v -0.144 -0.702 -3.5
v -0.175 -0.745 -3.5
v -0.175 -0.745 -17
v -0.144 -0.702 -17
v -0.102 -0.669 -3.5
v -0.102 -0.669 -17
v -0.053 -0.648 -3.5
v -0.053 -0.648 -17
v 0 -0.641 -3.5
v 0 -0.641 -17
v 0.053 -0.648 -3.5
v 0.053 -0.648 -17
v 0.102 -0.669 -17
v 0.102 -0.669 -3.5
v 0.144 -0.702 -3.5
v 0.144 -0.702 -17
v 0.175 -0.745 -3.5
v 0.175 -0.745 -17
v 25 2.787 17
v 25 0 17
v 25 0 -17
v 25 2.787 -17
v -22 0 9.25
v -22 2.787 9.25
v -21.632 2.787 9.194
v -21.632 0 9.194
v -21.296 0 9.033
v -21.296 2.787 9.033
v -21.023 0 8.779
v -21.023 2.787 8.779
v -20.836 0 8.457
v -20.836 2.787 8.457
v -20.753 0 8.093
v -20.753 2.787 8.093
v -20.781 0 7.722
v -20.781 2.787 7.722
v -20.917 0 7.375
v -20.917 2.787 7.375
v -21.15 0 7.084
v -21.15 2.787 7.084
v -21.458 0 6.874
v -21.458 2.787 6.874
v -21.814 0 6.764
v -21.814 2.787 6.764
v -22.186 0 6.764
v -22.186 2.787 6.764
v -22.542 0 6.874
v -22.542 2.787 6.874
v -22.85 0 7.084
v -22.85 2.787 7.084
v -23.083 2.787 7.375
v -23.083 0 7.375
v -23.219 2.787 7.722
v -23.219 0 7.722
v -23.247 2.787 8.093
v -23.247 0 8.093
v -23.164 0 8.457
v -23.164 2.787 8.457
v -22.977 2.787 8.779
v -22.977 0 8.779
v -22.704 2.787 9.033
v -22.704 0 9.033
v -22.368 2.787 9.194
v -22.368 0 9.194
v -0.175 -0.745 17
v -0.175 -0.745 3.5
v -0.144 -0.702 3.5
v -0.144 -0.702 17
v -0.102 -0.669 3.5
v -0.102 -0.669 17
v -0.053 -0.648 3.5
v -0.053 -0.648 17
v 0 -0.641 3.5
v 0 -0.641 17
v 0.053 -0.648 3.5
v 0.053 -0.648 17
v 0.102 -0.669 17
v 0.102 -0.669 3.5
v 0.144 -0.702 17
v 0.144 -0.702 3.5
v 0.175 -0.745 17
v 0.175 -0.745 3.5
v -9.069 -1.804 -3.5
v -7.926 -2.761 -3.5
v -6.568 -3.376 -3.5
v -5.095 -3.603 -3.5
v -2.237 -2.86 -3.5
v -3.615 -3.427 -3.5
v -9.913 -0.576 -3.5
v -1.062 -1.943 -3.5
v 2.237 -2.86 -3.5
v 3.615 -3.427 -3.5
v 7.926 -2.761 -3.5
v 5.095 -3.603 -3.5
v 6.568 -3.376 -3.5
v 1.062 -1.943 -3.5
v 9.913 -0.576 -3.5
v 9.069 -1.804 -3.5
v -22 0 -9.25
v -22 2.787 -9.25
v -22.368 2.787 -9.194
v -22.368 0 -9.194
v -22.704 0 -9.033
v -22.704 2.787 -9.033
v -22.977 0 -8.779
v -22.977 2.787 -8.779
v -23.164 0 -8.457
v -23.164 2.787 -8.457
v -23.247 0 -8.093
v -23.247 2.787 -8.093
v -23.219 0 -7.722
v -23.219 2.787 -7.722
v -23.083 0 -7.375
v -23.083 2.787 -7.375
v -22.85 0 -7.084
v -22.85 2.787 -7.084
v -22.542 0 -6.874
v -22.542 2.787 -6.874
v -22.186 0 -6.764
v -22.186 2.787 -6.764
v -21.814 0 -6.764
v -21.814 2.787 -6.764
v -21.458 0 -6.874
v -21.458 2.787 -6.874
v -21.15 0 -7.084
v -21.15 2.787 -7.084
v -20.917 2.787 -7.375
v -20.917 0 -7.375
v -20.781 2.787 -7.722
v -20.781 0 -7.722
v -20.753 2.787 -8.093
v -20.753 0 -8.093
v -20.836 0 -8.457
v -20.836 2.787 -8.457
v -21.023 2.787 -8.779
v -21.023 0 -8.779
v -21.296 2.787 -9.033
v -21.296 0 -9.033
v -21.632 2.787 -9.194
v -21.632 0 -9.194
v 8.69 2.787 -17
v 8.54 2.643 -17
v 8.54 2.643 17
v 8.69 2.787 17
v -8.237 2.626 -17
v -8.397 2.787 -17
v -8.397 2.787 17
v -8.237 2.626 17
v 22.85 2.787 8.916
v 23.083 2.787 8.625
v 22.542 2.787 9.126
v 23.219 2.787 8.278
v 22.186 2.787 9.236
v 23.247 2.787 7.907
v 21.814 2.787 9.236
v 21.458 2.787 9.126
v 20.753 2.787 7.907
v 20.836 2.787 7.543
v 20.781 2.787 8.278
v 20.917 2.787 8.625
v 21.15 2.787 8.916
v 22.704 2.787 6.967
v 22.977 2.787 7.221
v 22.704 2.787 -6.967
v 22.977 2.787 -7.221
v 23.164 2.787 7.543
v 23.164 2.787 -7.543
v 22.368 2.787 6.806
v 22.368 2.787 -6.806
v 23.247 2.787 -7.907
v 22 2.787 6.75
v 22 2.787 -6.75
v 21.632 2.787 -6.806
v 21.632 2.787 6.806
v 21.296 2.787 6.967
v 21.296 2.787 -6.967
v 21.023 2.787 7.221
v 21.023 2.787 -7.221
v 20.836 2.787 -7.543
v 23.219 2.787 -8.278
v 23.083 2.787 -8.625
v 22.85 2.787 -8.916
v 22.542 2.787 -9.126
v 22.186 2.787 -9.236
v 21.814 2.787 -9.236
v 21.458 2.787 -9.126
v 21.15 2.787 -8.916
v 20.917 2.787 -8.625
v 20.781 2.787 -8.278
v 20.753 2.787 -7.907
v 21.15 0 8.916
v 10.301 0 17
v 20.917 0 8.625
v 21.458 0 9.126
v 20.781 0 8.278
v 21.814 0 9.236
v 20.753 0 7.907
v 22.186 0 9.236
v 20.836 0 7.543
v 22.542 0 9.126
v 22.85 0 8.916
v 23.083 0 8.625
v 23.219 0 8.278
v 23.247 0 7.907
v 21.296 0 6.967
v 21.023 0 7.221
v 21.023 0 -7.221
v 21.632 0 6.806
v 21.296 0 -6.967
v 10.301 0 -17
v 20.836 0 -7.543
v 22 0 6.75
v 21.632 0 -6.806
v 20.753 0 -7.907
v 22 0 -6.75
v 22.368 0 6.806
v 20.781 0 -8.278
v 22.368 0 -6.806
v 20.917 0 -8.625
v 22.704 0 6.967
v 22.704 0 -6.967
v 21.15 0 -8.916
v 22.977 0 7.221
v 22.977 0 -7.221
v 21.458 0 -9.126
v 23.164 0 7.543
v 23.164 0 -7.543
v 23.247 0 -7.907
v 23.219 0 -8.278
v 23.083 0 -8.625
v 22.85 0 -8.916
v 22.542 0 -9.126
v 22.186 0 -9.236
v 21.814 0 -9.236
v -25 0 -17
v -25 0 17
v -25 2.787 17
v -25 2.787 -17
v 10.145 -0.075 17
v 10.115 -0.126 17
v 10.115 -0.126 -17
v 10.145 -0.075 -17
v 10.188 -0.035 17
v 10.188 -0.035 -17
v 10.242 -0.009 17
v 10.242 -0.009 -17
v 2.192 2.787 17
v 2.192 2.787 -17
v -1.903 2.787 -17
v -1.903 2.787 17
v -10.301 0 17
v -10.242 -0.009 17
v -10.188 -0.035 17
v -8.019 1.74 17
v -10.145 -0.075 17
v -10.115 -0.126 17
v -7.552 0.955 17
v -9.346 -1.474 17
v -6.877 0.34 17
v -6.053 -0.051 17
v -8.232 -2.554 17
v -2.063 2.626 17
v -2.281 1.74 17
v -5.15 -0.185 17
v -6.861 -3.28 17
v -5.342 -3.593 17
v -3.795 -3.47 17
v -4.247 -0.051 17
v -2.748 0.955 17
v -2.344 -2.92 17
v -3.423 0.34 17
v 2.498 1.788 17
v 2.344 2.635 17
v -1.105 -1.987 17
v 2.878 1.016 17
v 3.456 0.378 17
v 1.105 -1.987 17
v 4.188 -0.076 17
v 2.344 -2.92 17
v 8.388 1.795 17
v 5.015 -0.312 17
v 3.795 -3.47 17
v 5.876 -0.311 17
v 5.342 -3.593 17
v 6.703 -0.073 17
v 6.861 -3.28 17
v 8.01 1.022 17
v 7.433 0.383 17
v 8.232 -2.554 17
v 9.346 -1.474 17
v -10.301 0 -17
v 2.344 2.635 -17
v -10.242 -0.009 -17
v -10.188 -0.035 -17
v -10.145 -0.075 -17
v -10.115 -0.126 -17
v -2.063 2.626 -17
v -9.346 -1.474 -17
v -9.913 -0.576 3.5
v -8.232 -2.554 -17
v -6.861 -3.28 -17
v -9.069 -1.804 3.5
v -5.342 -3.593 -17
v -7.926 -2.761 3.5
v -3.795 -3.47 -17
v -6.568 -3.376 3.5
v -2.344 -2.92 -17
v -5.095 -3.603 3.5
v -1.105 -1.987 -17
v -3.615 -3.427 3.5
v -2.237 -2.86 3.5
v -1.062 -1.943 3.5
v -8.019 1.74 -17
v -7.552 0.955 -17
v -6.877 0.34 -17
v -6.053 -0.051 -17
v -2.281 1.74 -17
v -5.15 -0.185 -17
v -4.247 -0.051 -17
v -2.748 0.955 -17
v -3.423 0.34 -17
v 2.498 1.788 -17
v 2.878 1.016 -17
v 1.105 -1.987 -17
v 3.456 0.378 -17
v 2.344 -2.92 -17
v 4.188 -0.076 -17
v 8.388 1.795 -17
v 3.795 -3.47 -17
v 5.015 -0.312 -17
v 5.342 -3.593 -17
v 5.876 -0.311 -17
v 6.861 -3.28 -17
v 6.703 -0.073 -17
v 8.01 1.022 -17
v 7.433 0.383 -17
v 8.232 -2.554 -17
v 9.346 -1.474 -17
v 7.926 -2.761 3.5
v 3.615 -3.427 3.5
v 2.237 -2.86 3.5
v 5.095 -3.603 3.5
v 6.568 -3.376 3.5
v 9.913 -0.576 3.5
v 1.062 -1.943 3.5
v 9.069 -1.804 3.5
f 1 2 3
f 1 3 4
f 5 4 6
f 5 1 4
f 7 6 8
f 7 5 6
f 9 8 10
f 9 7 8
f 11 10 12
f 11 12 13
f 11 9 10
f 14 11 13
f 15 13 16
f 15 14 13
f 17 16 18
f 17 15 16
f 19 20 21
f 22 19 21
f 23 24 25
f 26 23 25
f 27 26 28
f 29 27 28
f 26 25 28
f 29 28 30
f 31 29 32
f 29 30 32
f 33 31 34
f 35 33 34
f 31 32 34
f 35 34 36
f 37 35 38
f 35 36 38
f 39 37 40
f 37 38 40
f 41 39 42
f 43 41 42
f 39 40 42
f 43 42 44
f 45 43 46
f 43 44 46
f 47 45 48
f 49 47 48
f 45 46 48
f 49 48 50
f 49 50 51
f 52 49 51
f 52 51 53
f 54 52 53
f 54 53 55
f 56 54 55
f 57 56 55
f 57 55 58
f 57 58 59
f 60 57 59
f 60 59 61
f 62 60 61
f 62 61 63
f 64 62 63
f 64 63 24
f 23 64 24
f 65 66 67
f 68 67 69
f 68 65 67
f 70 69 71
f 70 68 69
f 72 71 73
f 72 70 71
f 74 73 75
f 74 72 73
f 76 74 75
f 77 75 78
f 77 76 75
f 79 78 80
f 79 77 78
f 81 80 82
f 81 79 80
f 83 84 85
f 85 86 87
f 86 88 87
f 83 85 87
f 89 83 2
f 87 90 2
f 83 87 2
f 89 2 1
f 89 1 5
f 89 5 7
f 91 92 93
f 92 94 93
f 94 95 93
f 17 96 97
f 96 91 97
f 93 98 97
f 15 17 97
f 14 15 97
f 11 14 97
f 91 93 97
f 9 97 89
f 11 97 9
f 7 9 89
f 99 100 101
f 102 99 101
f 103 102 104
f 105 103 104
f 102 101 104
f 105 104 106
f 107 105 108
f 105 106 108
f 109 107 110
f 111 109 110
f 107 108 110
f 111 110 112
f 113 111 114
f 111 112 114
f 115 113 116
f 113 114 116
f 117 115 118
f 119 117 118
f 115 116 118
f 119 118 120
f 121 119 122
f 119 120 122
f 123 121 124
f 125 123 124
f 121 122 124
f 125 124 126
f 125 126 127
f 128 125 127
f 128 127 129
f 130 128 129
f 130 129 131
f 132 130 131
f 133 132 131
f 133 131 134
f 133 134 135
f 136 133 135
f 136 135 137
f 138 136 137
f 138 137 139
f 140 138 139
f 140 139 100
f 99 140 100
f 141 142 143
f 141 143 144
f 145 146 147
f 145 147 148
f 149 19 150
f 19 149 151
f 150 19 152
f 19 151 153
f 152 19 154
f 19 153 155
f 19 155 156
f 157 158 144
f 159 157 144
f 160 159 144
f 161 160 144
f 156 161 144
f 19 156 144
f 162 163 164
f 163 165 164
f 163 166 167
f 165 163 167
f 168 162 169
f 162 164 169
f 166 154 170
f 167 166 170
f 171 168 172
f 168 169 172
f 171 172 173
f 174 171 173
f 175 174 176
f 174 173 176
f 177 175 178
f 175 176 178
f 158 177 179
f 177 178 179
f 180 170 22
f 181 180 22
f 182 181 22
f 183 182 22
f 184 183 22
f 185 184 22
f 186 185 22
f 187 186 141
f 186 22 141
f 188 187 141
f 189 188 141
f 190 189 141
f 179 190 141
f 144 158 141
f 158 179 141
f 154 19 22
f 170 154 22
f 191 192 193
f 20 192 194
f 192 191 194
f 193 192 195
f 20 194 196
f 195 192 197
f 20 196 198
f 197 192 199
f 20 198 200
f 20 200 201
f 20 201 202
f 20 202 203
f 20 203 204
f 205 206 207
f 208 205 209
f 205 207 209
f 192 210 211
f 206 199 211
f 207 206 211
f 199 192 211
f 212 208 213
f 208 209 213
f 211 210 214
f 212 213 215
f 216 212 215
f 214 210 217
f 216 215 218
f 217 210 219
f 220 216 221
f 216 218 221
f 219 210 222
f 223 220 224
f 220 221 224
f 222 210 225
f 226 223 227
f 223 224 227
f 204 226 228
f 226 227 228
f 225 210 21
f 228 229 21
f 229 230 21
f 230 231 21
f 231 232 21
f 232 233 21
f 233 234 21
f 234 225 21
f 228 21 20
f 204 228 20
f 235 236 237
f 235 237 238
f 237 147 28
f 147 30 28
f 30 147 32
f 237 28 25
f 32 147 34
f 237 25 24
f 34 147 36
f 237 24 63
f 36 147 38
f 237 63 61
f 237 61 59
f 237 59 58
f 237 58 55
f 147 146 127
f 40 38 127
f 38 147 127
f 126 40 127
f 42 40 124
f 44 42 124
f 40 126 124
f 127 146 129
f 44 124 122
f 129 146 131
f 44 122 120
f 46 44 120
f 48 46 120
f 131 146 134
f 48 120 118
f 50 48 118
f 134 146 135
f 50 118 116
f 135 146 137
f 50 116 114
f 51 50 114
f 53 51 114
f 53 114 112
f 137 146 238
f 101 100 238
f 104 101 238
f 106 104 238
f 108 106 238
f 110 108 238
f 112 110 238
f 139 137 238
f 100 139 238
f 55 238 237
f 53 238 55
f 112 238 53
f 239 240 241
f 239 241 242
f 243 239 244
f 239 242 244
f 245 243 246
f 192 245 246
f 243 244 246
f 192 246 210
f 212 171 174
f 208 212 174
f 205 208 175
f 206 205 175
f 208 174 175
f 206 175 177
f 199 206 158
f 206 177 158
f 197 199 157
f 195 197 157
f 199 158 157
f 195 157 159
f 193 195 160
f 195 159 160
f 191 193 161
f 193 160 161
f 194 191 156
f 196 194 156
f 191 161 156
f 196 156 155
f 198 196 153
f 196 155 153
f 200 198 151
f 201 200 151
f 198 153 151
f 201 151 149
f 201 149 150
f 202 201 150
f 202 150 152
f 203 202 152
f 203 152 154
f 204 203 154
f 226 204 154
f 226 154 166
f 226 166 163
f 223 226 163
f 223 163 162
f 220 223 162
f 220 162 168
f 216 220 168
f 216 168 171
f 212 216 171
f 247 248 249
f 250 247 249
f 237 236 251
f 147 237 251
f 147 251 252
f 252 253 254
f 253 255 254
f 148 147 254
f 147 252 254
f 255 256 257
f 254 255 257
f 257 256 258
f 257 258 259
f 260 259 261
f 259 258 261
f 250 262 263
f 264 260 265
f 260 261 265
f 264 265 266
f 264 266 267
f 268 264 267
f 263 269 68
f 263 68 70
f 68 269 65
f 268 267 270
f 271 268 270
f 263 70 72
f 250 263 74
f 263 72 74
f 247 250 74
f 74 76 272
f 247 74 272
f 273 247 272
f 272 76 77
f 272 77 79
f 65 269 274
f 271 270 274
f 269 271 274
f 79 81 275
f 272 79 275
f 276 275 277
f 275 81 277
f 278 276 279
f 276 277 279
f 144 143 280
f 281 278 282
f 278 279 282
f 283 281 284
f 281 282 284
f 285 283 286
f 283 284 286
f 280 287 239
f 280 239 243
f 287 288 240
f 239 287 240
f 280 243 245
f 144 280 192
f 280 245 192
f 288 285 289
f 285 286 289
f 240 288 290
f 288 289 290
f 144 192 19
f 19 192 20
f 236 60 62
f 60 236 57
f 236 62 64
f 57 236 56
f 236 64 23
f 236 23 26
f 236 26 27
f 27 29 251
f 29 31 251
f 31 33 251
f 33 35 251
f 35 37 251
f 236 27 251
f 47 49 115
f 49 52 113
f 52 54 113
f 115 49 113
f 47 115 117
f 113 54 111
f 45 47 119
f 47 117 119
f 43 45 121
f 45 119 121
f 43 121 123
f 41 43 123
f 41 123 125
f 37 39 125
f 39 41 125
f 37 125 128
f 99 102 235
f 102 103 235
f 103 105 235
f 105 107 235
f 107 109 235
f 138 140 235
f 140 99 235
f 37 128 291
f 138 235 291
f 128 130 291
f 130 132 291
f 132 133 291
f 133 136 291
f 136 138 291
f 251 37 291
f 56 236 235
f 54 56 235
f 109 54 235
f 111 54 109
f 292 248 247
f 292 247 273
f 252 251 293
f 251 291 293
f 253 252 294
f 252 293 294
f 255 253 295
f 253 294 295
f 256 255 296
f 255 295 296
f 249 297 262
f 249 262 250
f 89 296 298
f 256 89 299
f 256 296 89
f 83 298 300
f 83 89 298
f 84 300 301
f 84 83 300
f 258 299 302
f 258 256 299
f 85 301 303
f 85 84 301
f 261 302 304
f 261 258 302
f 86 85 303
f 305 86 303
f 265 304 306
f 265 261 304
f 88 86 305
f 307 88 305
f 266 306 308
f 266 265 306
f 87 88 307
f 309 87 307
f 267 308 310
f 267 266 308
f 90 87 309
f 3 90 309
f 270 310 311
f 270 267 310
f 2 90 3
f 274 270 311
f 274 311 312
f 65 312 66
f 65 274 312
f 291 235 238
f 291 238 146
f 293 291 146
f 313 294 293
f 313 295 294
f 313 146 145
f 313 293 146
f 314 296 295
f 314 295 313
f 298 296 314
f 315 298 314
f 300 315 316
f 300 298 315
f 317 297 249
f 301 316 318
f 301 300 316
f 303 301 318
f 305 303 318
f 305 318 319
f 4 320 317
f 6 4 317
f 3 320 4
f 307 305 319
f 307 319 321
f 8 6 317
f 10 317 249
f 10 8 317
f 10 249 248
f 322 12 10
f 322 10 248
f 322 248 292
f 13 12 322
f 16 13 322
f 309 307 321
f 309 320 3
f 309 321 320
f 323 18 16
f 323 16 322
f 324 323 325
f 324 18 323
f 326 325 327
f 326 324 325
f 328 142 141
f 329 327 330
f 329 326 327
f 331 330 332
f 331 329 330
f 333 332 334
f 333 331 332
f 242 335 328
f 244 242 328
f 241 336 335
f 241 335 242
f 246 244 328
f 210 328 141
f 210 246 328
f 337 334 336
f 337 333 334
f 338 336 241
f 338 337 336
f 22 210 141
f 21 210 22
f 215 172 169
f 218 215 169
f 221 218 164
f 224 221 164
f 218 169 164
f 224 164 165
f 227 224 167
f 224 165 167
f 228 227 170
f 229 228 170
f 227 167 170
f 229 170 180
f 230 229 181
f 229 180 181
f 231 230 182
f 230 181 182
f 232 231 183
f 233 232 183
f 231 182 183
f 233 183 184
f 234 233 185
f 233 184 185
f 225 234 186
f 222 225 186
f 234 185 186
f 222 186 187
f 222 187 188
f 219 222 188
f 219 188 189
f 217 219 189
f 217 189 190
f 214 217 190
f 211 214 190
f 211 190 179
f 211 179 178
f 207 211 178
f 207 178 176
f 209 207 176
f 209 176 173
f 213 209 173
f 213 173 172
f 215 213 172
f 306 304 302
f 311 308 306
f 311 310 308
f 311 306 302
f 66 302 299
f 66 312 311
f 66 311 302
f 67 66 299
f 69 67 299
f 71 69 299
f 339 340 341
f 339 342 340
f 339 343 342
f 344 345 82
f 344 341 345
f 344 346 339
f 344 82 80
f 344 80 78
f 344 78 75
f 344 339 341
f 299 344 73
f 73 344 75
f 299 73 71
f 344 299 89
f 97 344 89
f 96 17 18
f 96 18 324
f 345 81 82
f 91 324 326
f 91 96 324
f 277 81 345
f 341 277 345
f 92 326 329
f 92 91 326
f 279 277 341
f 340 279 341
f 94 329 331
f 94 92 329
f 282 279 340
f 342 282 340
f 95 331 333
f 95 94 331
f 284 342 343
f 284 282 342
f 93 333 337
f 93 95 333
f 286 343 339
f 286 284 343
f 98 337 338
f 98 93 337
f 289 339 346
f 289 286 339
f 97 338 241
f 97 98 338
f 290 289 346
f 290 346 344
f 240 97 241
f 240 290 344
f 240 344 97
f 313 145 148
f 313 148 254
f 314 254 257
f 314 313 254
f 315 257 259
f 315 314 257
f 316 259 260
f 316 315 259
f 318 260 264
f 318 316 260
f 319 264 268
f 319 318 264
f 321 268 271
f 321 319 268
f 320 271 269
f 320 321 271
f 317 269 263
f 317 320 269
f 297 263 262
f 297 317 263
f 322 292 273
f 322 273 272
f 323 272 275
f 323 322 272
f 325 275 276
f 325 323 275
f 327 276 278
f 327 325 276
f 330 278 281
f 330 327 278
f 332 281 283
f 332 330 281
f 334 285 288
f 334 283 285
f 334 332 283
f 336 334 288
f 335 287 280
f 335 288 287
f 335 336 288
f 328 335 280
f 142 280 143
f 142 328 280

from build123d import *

# Parameters (mm, degrees)
SKETCH1_W           = 50
SKETCH1_H           = 34
BOSS_EXTRUDE1_DEPTH = 3
SKETCH2_W           = 38
SKETCH2_H           = 34
BOSS_EXTRUDE2_DEPTH = 3
SKETCH3_R           = 1.25
CUT_EXTRUDE1_DEPTH  = 3
BOSS_EXTRUDE3_DEPTH = 34
CUT_EXTRUDE4_DEPTH  = 43.626282972
SKETCH6_W           = 7
SKETCH6_H           = 4.004114793
CUT_EXTRUDE3_DEPTH  = 54.150729064
FILLET1_R           = 0.2
SKETCH8_W           = 4.910344877
SKETCH8_H           = 2.364797993
CUT_EXTRUDE5_DEPTH  = 43.626282972
FILLET2_R           = 0.5
SKETCH9_W           = 50
SKETCH9_H           = 6.499651724
CUT_EXTRUDE6_DEPTH  = 43.626282972
CHAMFER1_START      = -18
CHAMFER1_DEPTH      = 36


with BuildPart() as part:
    # Sketch1 → Boss-Extrude1 (new body)
    with BuildSketch(Plane(origin=(0, 0, 0), x_dir=(1, 0, 0), z_dir=(0, 1, 0))):
        Rectangle(SKETCH1_W, SKETCH1_H)
    extrude(amount=BOSS_EXTRUDE1_DEPTH)

    # Sketch2 → Boss-Extrude2 (add)
    with BuildSketch(Plane(origin=(0, 3, 0), x_dir=(1, 0, 0), z_dir=(0, 1, 0))):
        Rectangle(SKETCH2_W, SKETCH2_H)
    extrude(amount=BOSS_EXTRUDE2_DEPTH)

    # Sketch3 → Cut-Extrude1 (cut)
    with BuildSketch(Plane(origin=(0, 3, 0), x_dir=(1, 0, 0), z_dir=(0, 1, 0))):
        with Locations(Location((22, 8, 0), (0, 0, 270))):
            Circle(SKETCH3_R)
        with Locations(Location((22, -8, 0), (0, 0, 90))):
            Circle(SKETCH3_R)
        with Locations(Location((-22, -8, 0), (0, 0, 270))):
            Circle(SKETCH3_R)
        with Locations(Location((-22, 8, 0), (0, 0, 90))):
            Circle(SKETCH3_R)
    extrude(amount=-CUT_EXTRUDE1_DEPTH, mode=Mode.SUBTRACT)

    # Sketch5 → Boss-Extrude3 (add)
    with BuildSketch(Plane.XY.offset(17)):
        with BuildLine():
            Line((10.162882175, 0), (-10.162882175, 0))
            ThreePointArc((-10.162882175, 0), (-5.40902103, -3.588814383), (-0.175438596, -0.74480324))
            ThreePointArc((-0.175438596, -0.74480324), (0, -0.640830834), (0.175438596, -0.74480324))
            ThreePointArc((0.175438596, -0.74480324), (5.40902103, -3.588814383), (10.162882175, 0))
        make_face()
    extrude(amount=-BOSS_EXTRUDE3_DEPTH)

    # Sketch7 → Cut-Extrude4 (cut, through all)
    with BuildSketch(Plane(origin=(0, 0, -17), x_dir=(-1, 0, 0), z_dir=(0, 0, -1))):
        with BuildLine():
            Line((-8.541784002, 2.785692228), (-8.541784002, 8.770064047))
            Line((-8.541784002, 8.770064047), (8.249387021, 8.770064047))
            Line((8.249387021, 8.770064047), (8.249387021, 2.975059658))
            ThreePointArc((8.249387021, 2.975059658), (5.18491916, -0.185254174), (2.049991811, 2.905179016))
            Line((2.049991811, 2.905179016), (2.049991811, 5.195476311))
            Line((2.049991811, 5.195476311), (-2.343419325, 5.195476311))
            Line((-2.343419325, 5.195476311), (-2.343419325, 2.855696601))
            ThreePointArc((-2.343419325, 2.855696601), (-5.40689232, -0.341101373), (-8.541784002, 2.785692228))
        make_face()
    extrude(amount=-CUT_EXTRUDE4_DEPTH, mode=Mode.SUBTRACT)

    # Sketch6 → Cut-Extrude3 (cut, through all)
    with BuildSketch(Plane(origin=(25, 0, 0), x_dir=(0, 0, -1), z_dir=(1, 0, 0))):
        with Locations((0, -2.578040121)):
            Rectangle(SKETCH6_W, SKETCH6_H)
    extrude(amount=-CUT_EXTRUDE3_DEPTH, mode=Mode.SUBTRACT)

    # Fillet1
    fillet1_edges = [part.edges().sort_by_distance(p)[0] for p in [
        (10.162882175, 0, 0),
        (-10.162882175, 0, 0),
    ]]
    fillet(fillet1_edges, radius=FILLET1_R)

    # Sketch8 → Cut-Extrude5 (cut, through all)
    with BuildSketch(Plane(origin=(0, 0, -17), x_dir=(-1, 0, 0), z_dir=(0, 0, -1))):
        with Locations((-0.118869912, 4.00385134)):
            Rectangle(SKETCH8_W, SKETCH8_H)
    extrude(amount=-CUT_EXTRUDE5_DEPTH, mode=Mode.SUBTRACT)


with BuildPart() as cut_extrude5_kept_piece:
    # of the separate pieces the step leaves, the one the design keeps (cut_extrude5_pieces_kept)
    add(part.part.solids().sort_by_distance((-10.300657517, 0, -17))[0])

    # Fillet2
    fillet2_edges = [cut_extrude5_kept_piece.edges().sort_by_distance(p)[0] for p in [
        (8.541784002, 6, 0),
        (-8.249387021, 6, 0),
    ]]
    fillet(fillet2_edges, radius=FILLET2_R)

    # Sketch9 → Cut-Extrude6 (cut, through all)
    with BuildSketch(Plane(origin=(0, 0, -17), x_dir=(-1, 0, 0), z_dir=(0, 0, -1))):
        with Locations((0, 6.036788854)):
            Rectangle(SKETCH9_W, SKETCH9_H)
    extrude(amount=-CUT_EXTRUDE6_DEPTH, mode=Mode.SUBTRACT)

    # Chamfer1: read off the stored shape, not the designer's step
    # Chamfer1 outline → Chamfer1 (cut)
    with BuildSketch(Plane.XY.offset(CHAMFER1_START)):
        with BuildLine():
            ThreePointArc((8.541784002, 2.785692228), (8.541581007, 2.714125068), (8.539725958, 2.642581666))
            Line((8.539725958, 2.642581666), (8.689620689, 2.786962992))
            Line((8.689620689, 2.786962992), (8.541784002, 2.786962992))
            Line((8.541784002, 2.786962992), (8.541784002, 2.785692228))
        make_face()
        with BuildLine():
            Line((2.342030341, 2.786962992), (2.192030341, 2.786962992))
            Line((2.192030341, 2.786962992), (2.344386261, 2.634607072))
            ThreePointArc((2.344386261, 2.634607072), (2.342272067, 2.710770555), (2.342030341, 2.786962992))
        make_face()
        with BuildLine():
            ThreePointArc((-2.052604274, 2.786962992), (-2.05696798, 2.706483589), (-2.063422436, 2.62614483))
            Line((-2.063422436, 2.62614483), (-1.902604274, 2.786962992))
            Line((-1.902604274, 2.786962992), (-2.052604274, 2.786962992))
        make_face()
        with BuildLine():
            Line((-8.397351028, 2.786962992), (-8.236532866, 2.62614483))
            ThreePointArc((-8.236532866, 2.62614483), (-8.242987322, 2.706483589), (-8.247351028, 2.786962992))
            Line((-8.247351028, 2.786962992), (-8.397351028, 2.786962992))
        make_face()
    extrude(amount=CHAMFER1_DEPTH, mode=Mode.SUBTRACT)


solid = cut_extrude5_kept_piece.part
